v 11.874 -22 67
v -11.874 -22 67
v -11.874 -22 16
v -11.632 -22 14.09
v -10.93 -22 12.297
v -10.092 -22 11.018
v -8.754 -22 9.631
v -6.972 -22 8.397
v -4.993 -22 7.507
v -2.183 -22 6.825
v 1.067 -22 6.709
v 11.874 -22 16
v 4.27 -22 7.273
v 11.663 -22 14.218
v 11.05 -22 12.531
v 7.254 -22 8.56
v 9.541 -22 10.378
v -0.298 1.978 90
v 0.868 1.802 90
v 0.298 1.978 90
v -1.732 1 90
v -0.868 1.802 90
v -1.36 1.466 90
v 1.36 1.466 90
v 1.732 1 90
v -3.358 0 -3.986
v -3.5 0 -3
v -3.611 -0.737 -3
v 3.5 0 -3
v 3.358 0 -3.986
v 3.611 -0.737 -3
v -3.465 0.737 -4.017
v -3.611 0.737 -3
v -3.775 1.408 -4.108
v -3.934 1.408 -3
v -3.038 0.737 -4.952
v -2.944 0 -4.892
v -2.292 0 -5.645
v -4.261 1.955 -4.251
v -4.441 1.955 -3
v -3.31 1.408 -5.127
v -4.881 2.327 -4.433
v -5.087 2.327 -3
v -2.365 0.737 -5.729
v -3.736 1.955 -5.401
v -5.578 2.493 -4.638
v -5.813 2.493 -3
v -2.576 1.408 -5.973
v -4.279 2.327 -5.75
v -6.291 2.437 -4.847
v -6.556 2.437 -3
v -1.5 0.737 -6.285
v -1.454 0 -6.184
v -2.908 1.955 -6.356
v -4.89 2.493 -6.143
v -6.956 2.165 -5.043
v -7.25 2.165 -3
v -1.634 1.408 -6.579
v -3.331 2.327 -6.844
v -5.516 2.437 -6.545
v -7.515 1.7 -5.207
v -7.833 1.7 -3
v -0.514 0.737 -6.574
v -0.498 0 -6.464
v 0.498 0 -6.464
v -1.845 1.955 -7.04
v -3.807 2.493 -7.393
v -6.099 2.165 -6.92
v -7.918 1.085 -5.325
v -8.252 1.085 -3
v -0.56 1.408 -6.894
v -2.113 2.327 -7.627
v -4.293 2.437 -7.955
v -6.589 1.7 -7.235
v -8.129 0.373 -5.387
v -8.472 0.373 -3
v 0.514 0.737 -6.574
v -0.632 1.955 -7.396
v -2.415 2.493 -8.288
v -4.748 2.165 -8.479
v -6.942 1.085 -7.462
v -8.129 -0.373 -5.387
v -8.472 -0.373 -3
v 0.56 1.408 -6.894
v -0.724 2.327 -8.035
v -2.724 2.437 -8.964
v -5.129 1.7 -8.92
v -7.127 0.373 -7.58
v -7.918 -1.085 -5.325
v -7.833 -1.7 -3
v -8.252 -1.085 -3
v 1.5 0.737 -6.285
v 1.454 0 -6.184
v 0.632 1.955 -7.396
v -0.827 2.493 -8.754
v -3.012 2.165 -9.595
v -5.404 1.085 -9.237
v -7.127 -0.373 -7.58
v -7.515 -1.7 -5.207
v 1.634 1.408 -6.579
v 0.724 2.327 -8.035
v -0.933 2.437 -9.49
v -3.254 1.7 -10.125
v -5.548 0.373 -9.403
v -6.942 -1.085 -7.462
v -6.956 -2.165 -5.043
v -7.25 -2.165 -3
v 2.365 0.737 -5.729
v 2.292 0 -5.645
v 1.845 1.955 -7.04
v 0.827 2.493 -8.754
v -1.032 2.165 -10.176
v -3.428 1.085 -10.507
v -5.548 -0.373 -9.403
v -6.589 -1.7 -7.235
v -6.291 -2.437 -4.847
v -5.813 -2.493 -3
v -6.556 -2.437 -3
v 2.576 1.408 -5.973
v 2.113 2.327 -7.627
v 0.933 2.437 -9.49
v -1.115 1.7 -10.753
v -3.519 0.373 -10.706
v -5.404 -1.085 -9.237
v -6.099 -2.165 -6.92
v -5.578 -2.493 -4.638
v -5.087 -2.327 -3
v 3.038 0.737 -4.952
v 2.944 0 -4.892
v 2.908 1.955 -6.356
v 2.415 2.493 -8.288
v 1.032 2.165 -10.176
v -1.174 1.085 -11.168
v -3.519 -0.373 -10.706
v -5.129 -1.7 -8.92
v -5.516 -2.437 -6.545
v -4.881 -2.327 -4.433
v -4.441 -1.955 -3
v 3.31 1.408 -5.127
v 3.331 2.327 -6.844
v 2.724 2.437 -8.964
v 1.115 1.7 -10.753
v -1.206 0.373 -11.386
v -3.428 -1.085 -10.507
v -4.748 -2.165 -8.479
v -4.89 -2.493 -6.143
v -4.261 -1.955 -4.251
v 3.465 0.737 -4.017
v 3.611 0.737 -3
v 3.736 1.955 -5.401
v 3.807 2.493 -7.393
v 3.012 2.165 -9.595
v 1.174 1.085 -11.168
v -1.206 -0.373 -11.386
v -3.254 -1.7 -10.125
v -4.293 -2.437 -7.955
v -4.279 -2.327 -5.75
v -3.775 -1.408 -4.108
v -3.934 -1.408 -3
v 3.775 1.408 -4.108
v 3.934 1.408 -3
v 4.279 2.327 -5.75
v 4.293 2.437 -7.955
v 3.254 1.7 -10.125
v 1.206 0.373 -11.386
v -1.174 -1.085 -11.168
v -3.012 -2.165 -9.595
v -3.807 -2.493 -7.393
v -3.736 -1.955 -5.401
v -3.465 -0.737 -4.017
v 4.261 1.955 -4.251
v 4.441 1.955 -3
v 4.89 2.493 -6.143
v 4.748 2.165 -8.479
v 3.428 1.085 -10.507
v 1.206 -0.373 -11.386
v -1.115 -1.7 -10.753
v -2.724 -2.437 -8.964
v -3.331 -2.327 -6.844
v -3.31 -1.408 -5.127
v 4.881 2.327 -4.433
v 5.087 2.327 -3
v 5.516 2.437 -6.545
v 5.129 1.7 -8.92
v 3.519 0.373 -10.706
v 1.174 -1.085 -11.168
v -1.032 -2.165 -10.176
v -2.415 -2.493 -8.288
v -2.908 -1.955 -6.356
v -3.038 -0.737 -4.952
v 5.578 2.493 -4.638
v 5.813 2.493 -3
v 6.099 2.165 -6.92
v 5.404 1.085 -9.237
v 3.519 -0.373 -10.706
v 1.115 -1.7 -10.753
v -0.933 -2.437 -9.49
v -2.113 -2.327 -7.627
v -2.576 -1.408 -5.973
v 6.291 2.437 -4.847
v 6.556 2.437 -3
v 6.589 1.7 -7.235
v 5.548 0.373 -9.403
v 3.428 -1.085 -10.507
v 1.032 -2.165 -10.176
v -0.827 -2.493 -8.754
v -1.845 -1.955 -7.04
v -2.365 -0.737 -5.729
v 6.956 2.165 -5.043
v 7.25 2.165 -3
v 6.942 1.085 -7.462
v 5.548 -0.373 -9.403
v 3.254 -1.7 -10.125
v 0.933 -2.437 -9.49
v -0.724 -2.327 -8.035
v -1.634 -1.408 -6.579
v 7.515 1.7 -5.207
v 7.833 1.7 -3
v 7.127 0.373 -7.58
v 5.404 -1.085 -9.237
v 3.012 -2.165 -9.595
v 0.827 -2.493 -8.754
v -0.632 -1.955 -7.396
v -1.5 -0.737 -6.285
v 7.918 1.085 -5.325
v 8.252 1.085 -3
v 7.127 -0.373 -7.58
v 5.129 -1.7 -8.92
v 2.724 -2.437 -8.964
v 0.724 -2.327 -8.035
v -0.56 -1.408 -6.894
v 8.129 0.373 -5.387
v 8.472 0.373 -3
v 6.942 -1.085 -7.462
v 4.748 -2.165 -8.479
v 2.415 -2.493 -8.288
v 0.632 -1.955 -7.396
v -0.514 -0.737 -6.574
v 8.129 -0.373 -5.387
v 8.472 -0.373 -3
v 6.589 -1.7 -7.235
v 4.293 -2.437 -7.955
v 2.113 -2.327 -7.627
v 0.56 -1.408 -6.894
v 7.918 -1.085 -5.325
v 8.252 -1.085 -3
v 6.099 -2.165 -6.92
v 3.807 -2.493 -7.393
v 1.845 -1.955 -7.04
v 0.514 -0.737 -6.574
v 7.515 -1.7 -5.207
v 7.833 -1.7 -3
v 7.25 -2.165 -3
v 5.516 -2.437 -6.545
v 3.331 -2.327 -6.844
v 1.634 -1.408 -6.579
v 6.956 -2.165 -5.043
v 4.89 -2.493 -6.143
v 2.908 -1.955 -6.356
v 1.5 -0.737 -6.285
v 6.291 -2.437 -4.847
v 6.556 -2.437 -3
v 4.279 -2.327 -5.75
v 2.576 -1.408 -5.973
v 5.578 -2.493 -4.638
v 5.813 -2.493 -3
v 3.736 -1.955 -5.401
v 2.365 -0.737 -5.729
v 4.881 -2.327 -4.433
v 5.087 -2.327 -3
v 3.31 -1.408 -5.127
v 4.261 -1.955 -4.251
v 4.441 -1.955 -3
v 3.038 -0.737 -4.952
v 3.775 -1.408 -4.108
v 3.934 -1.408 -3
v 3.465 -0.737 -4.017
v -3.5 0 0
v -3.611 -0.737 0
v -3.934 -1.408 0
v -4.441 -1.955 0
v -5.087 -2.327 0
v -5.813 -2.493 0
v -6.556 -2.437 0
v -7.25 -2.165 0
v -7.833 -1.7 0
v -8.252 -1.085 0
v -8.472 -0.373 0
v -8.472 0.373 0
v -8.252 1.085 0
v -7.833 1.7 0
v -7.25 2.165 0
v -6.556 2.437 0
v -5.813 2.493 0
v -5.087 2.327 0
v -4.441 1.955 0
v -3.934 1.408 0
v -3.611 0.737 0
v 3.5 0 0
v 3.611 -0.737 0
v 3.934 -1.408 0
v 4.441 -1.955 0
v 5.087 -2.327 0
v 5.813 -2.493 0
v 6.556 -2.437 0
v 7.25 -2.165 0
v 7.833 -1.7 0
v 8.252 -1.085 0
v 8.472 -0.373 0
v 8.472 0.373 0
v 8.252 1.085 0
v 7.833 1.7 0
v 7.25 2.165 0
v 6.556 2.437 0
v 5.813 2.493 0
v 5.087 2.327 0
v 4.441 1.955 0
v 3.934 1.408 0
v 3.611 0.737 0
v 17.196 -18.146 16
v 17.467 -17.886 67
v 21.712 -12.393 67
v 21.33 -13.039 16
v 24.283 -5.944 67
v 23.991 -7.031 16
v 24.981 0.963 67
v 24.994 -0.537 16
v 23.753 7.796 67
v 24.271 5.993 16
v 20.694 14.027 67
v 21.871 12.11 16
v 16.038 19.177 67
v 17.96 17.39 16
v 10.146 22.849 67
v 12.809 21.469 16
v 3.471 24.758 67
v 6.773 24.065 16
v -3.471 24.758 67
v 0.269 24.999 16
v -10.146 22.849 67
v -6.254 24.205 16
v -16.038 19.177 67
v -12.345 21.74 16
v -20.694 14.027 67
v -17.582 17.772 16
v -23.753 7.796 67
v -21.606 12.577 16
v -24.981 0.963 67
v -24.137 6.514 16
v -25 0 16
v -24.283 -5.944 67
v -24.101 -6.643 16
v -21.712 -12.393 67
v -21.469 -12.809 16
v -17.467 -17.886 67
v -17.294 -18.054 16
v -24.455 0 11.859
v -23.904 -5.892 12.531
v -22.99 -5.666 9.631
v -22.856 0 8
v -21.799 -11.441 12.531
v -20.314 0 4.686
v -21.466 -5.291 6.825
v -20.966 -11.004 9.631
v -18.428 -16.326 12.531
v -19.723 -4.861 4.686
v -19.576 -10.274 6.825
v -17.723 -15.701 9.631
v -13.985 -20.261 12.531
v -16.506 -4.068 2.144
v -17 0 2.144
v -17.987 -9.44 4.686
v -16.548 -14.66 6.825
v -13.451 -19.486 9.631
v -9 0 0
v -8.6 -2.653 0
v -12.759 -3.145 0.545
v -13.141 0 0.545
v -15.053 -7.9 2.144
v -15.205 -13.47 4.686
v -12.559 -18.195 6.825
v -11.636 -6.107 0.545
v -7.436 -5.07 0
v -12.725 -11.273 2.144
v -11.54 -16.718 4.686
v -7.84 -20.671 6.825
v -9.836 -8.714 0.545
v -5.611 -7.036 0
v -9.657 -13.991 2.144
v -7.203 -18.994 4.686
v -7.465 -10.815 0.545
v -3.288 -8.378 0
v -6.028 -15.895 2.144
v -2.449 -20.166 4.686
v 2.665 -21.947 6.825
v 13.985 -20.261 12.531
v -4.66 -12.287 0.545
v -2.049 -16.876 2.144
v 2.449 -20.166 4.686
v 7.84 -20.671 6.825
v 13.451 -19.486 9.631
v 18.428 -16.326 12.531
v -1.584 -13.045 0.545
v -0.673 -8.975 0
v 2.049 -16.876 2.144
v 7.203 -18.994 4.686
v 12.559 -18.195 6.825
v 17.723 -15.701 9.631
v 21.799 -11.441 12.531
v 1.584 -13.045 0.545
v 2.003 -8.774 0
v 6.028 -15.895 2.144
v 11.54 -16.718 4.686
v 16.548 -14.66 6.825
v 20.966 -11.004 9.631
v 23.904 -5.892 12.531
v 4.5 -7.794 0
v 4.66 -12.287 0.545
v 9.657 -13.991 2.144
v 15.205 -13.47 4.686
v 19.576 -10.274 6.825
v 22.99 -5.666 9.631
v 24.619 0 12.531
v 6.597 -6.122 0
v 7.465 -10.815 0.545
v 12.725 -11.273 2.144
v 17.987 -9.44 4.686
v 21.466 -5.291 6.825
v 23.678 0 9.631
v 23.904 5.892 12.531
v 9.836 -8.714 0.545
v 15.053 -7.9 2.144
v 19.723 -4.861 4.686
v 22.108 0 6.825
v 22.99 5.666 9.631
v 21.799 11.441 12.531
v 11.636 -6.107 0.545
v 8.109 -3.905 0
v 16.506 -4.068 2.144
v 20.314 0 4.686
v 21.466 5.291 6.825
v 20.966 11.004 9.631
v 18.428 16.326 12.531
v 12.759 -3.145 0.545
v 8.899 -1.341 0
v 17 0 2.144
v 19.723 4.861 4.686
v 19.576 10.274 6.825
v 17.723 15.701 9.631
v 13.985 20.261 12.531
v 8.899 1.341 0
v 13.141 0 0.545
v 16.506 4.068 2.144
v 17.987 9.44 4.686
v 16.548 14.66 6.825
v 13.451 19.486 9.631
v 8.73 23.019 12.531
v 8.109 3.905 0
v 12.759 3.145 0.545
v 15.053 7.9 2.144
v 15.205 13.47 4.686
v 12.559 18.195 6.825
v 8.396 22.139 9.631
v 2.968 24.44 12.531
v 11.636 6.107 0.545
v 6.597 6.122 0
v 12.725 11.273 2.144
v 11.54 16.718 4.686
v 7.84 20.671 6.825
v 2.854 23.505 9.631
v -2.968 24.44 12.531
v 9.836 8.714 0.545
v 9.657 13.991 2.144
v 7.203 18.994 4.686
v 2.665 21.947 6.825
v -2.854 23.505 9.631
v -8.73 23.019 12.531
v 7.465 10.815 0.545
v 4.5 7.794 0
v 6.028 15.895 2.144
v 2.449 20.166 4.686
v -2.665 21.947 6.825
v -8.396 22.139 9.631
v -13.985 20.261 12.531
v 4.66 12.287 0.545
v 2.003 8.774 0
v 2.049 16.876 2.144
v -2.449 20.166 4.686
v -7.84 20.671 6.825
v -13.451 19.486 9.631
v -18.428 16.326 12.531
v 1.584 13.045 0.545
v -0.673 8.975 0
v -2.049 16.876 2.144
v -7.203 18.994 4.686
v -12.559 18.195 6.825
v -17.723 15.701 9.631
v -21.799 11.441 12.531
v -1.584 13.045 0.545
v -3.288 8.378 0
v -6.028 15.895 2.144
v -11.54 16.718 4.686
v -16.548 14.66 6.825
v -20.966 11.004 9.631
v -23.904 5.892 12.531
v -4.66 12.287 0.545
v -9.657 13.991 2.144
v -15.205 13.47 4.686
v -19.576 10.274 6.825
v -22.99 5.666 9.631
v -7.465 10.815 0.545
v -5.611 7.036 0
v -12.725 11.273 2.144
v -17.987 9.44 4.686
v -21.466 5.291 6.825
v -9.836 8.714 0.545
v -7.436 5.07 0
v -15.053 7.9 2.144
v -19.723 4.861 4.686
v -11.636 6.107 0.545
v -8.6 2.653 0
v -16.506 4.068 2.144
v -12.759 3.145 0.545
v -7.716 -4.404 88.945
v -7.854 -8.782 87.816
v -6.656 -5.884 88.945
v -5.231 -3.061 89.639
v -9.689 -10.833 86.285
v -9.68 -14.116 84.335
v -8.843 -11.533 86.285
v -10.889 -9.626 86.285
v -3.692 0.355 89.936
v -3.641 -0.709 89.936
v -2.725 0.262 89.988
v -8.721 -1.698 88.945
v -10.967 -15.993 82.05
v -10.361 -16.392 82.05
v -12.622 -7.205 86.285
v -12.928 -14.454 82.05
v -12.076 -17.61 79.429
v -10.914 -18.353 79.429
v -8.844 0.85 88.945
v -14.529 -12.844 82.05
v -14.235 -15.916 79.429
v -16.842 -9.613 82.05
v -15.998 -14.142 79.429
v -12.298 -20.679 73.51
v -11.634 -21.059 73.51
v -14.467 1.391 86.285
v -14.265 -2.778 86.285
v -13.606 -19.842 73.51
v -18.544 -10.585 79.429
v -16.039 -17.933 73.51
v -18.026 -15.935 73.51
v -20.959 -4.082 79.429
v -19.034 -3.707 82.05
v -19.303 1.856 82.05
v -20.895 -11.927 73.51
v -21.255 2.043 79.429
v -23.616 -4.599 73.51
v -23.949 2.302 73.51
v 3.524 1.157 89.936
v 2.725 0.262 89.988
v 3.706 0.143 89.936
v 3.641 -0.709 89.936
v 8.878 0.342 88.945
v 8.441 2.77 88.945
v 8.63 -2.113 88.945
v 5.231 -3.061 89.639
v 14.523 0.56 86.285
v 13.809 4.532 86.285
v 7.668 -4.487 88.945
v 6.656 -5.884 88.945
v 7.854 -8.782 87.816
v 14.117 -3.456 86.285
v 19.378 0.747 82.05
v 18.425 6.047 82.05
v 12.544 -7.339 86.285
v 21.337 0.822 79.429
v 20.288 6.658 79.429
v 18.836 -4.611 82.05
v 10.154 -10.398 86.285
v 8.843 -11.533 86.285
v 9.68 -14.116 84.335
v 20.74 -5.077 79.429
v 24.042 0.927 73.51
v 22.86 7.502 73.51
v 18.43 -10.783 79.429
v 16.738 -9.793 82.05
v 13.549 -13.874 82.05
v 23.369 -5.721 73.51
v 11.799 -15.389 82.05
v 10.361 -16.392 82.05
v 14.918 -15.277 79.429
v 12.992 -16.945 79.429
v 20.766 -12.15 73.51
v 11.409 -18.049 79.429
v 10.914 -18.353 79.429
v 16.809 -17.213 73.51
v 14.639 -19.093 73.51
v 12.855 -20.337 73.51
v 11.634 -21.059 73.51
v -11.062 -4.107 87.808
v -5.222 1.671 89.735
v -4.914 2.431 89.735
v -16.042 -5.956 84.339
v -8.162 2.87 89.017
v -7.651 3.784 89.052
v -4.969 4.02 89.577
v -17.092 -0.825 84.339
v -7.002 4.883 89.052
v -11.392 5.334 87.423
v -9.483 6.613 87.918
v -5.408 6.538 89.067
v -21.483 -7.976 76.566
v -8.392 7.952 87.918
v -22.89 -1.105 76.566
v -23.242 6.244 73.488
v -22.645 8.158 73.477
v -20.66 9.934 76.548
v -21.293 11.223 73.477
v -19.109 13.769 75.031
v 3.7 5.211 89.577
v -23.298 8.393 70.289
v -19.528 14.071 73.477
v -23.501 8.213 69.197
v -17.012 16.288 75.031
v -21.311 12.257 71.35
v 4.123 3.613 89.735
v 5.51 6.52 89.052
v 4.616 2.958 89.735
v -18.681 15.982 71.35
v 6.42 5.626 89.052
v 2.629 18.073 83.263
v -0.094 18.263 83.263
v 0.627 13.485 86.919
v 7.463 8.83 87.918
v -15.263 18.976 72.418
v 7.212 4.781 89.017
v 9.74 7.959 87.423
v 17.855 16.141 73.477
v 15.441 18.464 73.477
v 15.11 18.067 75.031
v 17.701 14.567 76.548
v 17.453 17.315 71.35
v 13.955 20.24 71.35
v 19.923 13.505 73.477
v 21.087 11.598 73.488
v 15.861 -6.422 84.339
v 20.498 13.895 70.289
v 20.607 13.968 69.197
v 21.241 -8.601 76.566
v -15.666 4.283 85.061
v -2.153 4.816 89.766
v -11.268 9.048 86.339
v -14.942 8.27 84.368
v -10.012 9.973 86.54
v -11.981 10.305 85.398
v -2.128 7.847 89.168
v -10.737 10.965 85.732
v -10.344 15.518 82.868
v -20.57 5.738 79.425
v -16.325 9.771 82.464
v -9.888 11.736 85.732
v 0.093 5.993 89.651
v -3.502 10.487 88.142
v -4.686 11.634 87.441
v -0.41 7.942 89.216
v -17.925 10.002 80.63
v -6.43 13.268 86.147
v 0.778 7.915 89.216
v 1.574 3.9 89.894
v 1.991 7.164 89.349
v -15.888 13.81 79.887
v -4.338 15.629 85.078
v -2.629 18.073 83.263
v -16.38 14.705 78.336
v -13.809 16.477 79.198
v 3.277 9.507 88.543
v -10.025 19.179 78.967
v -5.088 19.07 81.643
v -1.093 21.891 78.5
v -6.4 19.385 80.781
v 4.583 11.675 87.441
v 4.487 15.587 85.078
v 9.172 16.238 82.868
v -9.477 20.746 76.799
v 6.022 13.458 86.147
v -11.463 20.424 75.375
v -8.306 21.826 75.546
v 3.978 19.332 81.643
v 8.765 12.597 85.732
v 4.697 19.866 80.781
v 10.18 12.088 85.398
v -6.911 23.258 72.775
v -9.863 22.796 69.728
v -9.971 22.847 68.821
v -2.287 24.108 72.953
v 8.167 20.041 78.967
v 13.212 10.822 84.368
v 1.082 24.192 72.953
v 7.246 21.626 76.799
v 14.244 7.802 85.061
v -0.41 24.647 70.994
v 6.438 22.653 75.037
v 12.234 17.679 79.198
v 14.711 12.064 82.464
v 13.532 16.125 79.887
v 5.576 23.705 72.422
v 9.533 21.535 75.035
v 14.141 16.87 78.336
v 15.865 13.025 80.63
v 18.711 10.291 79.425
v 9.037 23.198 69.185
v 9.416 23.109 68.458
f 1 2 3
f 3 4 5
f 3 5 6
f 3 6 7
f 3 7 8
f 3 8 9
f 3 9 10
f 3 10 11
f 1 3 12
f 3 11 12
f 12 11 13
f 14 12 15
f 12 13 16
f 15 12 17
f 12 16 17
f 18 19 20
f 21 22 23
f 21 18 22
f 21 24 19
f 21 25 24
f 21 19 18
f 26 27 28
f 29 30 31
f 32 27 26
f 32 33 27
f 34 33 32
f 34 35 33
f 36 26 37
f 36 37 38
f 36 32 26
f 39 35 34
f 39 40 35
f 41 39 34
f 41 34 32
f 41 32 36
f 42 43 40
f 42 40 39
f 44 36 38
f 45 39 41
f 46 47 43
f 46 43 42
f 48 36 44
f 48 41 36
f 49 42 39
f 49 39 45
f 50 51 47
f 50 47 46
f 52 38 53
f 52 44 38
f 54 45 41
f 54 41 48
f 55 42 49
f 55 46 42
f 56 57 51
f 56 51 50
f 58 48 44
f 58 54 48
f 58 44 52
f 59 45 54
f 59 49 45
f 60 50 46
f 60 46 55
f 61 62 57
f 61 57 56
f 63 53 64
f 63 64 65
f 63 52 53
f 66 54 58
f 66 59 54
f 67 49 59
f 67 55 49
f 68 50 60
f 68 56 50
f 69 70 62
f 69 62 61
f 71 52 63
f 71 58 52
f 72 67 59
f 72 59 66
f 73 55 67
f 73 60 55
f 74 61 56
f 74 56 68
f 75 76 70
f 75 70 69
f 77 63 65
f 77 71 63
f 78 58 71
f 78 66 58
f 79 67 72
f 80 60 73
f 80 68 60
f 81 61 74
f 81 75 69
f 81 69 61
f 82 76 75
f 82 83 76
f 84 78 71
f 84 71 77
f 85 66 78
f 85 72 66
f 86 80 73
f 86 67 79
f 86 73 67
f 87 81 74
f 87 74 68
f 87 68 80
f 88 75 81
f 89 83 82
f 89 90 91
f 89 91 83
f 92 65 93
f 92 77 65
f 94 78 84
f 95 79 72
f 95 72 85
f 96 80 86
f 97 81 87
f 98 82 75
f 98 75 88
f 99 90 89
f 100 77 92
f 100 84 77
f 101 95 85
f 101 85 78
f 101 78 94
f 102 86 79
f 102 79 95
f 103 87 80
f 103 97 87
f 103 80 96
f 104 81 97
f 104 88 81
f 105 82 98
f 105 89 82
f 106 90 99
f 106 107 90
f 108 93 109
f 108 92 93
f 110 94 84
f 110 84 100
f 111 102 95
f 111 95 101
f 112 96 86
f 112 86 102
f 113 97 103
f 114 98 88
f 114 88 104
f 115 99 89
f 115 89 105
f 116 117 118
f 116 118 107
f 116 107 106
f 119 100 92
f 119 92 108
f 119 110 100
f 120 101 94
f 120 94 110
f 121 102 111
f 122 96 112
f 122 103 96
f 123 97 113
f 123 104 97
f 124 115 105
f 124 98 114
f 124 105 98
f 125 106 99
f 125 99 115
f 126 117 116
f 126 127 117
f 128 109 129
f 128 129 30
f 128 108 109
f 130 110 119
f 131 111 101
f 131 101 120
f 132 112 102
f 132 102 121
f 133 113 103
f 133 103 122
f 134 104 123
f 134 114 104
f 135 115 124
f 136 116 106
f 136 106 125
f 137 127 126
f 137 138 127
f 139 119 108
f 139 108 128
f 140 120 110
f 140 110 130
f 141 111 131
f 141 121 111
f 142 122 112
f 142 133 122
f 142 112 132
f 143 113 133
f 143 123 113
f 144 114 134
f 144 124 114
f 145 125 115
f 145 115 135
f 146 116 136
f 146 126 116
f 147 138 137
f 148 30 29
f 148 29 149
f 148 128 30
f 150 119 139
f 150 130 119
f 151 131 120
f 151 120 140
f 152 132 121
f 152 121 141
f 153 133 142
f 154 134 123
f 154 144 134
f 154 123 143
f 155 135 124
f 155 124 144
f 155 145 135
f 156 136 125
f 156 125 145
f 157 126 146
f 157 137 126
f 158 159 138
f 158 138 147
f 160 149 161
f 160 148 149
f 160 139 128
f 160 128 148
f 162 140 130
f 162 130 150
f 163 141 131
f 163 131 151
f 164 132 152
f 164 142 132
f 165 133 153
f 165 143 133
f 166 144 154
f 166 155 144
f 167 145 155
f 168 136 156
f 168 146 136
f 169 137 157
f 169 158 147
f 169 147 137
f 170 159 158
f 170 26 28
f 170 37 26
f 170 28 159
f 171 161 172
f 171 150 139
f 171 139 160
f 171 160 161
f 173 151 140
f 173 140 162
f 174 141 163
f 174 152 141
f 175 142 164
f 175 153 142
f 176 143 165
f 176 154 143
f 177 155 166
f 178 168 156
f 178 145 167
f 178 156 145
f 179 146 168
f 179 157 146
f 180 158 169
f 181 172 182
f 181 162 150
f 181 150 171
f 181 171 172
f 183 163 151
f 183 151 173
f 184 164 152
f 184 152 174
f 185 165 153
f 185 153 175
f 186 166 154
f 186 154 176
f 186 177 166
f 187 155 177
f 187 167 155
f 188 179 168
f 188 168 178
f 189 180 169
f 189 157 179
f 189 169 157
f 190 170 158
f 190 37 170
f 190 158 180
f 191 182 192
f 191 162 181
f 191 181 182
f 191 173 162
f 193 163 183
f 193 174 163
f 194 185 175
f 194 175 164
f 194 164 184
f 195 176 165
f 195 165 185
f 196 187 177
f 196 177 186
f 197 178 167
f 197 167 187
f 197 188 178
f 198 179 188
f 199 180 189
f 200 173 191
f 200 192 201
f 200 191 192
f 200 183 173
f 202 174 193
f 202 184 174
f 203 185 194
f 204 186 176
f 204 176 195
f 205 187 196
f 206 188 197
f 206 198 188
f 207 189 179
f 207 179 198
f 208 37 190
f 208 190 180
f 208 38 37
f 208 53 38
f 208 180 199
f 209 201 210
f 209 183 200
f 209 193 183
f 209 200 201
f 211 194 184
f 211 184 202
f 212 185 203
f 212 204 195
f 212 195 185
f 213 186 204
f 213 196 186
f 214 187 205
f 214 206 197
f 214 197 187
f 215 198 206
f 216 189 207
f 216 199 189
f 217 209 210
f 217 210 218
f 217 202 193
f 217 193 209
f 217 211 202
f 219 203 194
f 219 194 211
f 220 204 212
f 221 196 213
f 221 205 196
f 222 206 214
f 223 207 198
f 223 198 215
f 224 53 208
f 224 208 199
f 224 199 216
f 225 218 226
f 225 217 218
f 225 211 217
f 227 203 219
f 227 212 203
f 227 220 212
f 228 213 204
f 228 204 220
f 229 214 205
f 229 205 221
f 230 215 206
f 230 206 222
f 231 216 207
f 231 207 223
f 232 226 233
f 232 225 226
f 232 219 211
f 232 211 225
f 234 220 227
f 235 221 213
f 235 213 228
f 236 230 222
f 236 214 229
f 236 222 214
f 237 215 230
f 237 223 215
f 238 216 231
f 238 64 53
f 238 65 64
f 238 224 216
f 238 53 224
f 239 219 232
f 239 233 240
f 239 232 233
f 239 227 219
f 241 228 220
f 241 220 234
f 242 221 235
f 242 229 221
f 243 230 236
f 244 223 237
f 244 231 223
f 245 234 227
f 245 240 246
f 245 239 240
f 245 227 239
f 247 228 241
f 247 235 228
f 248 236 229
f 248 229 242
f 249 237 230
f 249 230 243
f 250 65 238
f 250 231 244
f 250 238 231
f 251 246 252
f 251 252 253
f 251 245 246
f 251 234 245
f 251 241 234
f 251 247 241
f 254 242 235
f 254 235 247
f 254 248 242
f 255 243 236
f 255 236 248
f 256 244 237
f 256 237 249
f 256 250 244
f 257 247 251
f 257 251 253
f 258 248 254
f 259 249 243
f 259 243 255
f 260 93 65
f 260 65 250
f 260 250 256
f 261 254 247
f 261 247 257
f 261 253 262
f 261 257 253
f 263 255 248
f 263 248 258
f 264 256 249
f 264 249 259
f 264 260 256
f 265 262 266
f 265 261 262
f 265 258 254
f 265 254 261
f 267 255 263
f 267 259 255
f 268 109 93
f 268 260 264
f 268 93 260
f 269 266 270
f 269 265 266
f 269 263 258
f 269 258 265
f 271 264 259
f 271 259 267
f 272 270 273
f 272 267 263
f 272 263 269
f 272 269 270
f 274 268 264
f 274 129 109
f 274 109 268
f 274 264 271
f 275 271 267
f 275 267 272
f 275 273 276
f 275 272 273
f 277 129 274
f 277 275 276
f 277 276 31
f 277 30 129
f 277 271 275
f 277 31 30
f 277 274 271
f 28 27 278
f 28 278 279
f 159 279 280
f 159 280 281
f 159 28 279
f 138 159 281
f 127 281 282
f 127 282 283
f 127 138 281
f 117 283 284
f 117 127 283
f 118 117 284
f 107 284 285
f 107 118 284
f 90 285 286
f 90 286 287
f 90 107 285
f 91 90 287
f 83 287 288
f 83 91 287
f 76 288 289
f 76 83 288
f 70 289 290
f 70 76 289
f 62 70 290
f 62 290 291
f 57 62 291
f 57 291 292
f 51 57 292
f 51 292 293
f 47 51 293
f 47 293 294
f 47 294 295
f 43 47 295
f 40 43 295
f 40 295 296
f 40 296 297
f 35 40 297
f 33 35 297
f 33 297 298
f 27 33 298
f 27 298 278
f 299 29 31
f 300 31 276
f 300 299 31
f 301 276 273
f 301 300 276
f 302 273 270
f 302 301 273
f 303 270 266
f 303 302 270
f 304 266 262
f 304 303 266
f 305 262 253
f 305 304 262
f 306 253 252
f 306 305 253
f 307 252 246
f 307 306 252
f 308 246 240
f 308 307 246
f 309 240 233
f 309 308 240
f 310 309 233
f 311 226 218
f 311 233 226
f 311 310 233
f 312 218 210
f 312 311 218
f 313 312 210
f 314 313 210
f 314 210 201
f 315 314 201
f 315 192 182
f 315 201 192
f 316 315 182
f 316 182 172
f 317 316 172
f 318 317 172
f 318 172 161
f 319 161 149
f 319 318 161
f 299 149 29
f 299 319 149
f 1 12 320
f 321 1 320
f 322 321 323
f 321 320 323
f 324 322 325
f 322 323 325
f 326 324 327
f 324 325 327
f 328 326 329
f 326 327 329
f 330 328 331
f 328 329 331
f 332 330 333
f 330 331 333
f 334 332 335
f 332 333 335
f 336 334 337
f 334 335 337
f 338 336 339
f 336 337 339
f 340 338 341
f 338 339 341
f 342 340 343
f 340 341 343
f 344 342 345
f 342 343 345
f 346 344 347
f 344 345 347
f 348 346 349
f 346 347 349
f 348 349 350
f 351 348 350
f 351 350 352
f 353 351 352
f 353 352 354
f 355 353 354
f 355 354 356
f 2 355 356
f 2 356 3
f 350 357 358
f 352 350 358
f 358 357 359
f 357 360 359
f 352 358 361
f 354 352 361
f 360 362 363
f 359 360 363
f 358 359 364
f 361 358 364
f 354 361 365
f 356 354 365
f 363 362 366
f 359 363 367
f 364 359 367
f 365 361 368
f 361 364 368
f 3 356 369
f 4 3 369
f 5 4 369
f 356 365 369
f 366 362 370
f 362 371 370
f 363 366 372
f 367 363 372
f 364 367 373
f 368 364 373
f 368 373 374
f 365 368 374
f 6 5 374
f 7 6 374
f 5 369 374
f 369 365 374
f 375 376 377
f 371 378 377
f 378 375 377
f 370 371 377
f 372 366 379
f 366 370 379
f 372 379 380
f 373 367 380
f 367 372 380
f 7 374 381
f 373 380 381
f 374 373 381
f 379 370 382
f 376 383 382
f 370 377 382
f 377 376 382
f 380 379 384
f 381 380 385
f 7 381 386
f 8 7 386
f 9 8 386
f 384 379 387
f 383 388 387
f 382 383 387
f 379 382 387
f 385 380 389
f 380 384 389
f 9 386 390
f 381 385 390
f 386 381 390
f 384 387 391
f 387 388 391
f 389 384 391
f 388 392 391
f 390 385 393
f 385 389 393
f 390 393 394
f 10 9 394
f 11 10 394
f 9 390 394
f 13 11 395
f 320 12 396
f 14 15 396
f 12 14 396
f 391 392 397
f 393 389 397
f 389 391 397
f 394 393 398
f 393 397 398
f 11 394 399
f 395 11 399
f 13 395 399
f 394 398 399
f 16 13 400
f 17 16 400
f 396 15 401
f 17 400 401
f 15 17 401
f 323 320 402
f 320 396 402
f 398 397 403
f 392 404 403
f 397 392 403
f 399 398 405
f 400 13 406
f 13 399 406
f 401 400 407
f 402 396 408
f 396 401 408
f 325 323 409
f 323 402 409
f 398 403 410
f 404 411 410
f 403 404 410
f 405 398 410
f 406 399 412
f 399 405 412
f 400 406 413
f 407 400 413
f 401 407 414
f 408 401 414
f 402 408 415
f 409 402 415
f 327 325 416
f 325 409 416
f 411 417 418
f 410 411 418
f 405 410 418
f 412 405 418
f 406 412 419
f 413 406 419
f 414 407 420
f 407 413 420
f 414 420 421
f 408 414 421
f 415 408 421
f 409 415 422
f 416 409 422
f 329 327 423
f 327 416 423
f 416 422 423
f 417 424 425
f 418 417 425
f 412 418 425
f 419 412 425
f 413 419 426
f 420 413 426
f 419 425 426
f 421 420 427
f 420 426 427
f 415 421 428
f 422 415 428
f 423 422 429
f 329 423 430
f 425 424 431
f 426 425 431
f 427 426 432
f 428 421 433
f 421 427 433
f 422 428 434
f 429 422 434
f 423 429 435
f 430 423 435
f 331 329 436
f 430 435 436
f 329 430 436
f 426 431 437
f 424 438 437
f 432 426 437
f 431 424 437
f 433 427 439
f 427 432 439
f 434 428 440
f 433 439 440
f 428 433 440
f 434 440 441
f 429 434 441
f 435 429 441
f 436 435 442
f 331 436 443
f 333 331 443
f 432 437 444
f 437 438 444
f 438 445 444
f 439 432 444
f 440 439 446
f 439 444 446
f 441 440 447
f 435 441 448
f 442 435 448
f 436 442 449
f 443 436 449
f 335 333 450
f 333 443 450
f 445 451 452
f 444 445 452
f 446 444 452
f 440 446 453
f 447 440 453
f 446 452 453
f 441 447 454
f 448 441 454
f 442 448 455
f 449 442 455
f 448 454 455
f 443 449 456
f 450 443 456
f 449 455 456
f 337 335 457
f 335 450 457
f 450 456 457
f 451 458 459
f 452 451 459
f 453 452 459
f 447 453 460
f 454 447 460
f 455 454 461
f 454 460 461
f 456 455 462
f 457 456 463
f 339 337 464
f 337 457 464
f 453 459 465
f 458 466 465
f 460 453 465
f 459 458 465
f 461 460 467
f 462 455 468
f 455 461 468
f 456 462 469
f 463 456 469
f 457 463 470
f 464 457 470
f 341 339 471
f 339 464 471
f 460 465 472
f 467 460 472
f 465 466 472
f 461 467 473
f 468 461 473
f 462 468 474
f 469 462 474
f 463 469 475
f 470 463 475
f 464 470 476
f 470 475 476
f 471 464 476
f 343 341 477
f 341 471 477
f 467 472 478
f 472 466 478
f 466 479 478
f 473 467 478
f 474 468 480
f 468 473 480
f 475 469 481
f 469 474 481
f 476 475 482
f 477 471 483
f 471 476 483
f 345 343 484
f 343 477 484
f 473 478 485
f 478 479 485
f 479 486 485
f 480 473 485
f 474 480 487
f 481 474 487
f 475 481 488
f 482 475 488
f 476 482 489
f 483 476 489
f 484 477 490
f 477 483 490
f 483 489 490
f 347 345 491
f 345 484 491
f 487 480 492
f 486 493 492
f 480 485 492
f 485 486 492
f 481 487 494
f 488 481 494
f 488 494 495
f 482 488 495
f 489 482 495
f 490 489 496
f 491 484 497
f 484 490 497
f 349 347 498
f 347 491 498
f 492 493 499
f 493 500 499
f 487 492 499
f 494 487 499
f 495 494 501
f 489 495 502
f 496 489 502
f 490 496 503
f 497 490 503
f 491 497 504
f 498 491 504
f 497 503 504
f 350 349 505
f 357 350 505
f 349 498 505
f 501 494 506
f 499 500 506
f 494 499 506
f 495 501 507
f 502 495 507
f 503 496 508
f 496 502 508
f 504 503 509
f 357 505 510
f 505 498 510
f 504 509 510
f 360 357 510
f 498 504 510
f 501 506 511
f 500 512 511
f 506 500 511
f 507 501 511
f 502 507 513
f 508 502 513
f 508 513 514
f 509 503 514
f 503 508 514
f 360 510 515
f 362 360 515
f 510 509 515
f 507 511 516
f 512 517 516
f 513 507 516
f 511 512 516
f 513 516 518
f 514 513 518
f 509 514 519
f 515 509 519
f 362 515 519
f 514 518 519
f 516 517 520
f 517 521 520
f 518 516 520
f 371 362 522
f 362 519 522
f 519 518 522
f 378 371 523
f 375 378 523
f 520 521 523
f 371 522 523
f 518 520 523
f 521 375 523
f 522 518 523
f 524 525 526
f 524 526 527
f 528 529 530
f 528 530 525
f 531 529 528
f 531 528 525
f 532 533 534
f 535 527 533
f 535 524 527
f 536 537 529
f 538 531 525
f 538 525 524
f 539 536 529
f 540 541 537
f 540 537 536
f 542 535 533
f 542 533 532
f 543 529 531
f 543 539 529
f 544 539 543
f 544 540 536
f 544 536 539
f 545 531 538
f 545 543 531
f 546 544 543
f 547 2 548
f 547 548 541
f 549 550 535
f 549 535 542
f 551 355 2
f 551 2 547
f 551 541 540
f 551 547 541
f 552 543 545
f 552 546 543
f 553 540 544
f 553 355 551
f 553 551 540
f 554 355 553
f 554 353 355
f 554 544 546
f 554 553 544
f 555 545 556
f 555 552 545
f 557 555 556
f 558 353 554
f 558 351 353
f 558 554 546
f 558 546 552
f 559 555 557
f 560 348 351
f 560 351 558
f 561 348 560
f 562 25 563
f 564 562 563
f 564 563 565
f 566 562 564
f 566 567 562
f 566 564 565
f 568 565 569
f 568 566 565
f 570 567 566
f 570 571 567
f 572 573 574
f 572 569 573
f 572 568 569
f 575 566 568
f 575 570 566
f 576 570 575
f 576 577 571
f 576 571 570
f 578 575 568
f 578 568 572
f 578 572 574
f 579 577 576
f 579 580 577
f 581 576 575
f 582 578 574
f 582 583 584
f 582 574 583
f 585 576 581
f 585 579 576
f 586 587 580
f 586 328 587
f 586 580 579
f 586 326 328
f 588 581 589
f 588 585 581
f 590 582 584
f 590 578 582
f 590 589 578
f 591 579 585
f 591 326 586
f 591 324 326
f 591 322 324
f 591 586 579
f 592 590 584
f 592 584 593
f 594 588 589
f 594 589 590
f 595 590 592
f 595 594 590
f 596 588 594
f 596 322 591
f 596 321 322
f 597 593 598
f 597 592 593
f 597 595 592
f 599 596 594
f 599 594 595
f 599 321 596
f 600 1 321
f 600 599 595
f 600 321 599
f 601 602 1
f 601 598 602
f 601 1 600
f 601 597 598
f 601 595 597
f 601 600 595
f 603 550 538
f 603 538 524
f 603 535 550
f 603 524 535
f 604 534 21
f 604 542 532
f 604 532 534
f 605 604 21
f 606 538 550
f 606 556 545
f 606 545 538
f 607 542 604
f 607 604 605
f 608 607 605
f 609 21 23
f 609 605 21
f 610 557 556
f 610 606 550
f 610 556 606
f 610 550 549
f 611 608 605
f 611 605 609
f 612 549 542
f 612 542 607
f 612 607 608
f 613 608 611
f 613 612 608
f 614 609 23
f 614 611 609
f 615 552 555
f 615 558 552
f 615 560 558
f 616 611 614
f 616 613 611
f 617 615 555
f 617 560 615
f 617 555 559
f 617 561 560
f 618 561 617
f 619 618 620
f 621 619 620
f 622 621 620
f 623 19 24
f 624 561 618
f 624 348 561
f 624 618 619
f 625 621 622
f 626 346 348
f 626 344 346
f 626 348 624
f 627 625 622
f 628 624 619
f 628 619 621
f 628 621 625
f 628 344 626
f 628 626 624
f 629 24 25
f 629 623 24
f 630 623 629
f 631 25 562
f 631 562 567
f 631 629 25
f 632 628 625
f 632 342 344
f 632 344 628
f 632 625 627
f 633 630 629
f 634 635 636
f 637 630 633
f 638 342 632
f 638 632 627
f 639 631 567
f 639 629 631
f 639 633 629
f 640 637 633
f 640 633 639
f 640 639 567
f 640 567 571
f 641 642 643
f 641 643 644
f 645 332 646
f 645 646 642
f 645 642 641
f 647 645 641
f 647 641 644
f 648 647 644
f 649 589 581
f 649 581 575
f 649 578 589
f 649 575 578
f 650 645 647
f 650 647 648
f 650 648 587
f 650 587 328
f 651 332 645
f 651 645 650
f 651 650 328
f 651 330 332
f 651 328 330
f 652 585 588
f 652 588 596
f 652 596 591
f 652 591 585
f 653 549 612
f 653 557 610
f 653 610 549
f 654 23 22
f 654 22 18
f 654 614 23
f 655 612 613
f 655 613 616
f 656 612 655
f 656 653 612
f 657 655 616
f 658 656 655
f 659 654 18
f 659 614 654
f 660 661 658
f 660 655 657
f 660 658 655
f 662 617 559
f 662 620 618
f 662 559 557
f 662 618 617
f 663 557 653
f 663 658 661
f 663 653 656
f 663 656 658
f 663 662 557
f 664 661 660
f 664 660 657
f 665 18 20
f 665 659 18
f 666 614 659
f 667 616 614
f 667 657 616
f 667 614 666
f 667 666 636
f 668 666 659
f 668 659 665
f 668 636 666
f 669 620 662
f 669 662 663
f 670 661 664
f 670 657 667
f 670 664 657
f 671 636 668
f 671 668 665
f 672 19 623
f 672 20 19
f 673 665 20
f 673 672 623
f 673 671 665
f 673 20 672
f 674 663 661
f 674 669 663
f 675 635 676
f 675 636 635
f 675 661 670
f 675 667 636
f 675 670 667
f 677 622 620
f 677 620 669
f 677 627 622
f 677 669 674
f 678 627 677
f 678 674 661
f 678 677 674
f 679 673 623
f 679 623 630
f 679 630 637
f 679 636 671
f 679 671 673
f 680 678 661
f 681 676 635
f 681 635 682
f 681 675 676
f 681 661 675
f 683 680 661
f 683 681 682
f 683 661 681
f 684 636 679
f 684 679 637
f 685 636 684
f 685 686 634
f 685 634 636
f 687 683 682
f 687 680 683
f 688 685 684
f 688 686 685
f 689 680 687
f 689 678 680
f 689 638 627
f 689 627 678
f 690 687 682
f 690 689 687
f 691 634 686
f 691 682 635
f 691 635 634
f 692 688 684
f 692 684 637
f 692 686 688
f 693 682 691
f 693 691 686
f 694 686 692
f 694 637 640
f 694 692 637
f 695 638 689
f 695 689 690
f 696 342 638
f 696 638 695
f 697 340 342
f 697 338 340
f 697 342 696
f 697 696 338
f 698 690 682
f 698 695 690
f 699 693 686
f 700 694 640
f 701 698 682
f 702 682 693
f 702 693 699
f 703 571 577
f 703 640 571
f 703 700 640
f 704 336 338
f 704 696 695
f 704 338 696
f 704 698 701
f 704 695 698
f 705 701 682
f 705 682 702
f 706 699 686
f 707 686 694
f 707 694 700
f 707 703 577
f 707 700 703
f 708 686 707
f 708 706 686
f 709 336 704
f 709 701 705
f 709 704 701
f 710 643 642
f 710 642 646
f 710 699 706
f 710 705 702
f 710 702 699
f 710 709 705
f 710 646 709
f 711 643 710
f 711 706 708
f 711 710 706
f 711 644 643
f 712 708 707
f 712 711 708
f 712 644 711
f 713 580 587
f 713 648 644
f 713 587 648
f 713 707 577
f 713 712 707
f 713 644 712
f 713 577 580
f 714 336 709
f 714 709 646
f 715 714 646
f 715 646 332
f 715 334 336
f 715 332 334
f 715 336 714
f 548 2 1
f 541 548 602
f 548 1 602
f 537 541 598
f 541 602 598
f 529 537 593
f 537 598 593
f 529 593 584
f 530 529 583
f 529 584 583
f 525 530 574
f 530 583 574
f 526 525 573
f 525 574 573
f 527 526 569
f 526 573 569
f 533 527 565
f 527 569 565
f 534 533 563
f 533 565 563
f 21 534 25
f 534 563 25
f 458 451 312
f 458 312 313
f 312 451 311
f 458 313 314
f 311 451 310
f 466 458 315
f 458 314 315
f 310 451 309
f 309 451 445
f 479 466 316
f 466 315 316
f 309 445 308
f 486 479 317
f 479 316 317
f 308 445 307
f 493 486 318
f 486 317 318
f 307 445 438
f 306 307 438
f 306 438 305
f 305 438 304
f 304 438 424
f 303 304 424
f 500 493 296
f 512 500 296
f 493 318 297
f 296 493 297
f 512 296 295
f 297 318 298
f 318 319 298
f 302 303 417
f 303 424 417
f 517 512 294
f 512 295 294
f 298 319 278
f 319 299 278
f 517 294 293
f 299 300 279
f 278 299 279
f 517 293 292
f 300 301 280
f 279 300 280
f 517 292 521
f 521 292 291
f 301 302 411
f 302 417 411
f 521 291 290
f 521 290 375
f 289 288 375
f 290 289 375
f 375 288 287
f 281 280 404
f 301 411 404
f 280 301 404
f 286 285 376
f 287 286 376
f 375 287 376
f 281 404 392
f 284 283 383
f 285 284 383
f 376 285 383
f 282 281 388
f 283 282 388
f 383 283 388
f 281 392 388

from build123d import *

# Parameters (mm, degrees)
CROQUIS1_R              = 25
SALIENTE_EXTRUIR1_DEPTH = 90
CROQUIS4_R              = 2.5
REDONDEO2_R             = 16
CORTAR_EXTRUIR2_START   = -22
CROQUIS12_W             = 90
CROQUIS12_H             = 90
CORTAR_EXTRUIR2_DEPTH   = 30
REDONDEO3_R             = 23


with BuildPart() as part:
    # Croquis1 → Saliente-Extruir1 (new body)
    with BuildSketch(Plane.XY):
        with Locations(Location((0, 0, 0), (0, 0, 180))):
            Circle(CROQUIS1_R)
    extrude(amount=SALIENTE_EXTRUIR1_DEPTH)

    # Barrer3: sweep along a path in Croquis3
    with BuildLine(Plane(origin=(0, 0, 0), x_dir=(1, 0, 0), z_dir=(0, 1, 0))) as barrer3_path:
        Line((-3, 0), (-3, 3))
        ThreePointArc((-3, 3), (0, 6), (3, 3))
        Line((3, 3), (3, 0))
    # Croquis4 → Barrer3 (sweep)
    with BuildSketch(Plane(origin=(0, 0, 0), x_dir=(-1, 0, 0), z_dir=(0, 0, -1))):
        with Locations((-6, 0)):
            Circle(CROQUIS4_R)
    sweep(path=barrer3_path.line)

    # Redondeo2
    redondeo2_edges = [part.edges().sort_by_distance(p)[0] for p in [
        (25, 0, 0),
    ]]
    fillet(redondeo2_edges, radius=REDONDEO2_R)

    # Croquis12 → Cortar-Extruir2 (cut)
    with BuildSketch(Plane(origin=(0, 0, 0), x_dir=(1, 0, 0), z_dir=(0, 1, 0)).offset(CORTAR_EXTRUIR2_START)):
        with Locations((-20, -45)):
            Rectangle(CROQUIS12_W, CROQUIS12_H)
    extrude(amount=-CORTAR_EXTRUIR2_DEPTH, mode=Mode.SUBTRACT)

    # Redondeo3
    # the kernel refuses this fillet: 23 mm, written as the material it takes off along each edge
    with BuildSketch(Plane(origin=(0, 0, 90), x_dir=(-0.003141587485819883, -0.9999950652018583, 0), z_dir=(0.9999950652018583, -0.003141587485819883, 0))) as redondeo3_piece_1:
        with BuildLine():
            CenterArc((25 - REDONDEO3_R, REDONDEO3_R), REDONDEO3_R, 270, 90)
            Line((25 - REDONDEO3_R, 0), (25, 0))
            Line((25, 0), (25, REDONDEO3_R))
        make_face()
    revolve(axis=Axis((0, 0, 90), (0, 0, -1)), revolution_arc=359.64, mode=Mode.SUBTRACT)
    with BuildSketch(Plane(origin=(69.374342087, -22, 90), x_dir=(0, 1, 0), z_dir=(-1, 0, 0))) as redondeo3_piece_2:
        with BuildLine():
            CenterArc((REDONDEO3_R, REDONDEO3_R), REDONDEO3_R, 180, 90)
            Line((0, REDONDEO3_R), (0, 0))
            Line((0, 0), (REDONDEO3_R, 0))
        make_face()
    extrude(amount=138.748684174, mode=Mode.SUBTRACT)


solid = part.part
